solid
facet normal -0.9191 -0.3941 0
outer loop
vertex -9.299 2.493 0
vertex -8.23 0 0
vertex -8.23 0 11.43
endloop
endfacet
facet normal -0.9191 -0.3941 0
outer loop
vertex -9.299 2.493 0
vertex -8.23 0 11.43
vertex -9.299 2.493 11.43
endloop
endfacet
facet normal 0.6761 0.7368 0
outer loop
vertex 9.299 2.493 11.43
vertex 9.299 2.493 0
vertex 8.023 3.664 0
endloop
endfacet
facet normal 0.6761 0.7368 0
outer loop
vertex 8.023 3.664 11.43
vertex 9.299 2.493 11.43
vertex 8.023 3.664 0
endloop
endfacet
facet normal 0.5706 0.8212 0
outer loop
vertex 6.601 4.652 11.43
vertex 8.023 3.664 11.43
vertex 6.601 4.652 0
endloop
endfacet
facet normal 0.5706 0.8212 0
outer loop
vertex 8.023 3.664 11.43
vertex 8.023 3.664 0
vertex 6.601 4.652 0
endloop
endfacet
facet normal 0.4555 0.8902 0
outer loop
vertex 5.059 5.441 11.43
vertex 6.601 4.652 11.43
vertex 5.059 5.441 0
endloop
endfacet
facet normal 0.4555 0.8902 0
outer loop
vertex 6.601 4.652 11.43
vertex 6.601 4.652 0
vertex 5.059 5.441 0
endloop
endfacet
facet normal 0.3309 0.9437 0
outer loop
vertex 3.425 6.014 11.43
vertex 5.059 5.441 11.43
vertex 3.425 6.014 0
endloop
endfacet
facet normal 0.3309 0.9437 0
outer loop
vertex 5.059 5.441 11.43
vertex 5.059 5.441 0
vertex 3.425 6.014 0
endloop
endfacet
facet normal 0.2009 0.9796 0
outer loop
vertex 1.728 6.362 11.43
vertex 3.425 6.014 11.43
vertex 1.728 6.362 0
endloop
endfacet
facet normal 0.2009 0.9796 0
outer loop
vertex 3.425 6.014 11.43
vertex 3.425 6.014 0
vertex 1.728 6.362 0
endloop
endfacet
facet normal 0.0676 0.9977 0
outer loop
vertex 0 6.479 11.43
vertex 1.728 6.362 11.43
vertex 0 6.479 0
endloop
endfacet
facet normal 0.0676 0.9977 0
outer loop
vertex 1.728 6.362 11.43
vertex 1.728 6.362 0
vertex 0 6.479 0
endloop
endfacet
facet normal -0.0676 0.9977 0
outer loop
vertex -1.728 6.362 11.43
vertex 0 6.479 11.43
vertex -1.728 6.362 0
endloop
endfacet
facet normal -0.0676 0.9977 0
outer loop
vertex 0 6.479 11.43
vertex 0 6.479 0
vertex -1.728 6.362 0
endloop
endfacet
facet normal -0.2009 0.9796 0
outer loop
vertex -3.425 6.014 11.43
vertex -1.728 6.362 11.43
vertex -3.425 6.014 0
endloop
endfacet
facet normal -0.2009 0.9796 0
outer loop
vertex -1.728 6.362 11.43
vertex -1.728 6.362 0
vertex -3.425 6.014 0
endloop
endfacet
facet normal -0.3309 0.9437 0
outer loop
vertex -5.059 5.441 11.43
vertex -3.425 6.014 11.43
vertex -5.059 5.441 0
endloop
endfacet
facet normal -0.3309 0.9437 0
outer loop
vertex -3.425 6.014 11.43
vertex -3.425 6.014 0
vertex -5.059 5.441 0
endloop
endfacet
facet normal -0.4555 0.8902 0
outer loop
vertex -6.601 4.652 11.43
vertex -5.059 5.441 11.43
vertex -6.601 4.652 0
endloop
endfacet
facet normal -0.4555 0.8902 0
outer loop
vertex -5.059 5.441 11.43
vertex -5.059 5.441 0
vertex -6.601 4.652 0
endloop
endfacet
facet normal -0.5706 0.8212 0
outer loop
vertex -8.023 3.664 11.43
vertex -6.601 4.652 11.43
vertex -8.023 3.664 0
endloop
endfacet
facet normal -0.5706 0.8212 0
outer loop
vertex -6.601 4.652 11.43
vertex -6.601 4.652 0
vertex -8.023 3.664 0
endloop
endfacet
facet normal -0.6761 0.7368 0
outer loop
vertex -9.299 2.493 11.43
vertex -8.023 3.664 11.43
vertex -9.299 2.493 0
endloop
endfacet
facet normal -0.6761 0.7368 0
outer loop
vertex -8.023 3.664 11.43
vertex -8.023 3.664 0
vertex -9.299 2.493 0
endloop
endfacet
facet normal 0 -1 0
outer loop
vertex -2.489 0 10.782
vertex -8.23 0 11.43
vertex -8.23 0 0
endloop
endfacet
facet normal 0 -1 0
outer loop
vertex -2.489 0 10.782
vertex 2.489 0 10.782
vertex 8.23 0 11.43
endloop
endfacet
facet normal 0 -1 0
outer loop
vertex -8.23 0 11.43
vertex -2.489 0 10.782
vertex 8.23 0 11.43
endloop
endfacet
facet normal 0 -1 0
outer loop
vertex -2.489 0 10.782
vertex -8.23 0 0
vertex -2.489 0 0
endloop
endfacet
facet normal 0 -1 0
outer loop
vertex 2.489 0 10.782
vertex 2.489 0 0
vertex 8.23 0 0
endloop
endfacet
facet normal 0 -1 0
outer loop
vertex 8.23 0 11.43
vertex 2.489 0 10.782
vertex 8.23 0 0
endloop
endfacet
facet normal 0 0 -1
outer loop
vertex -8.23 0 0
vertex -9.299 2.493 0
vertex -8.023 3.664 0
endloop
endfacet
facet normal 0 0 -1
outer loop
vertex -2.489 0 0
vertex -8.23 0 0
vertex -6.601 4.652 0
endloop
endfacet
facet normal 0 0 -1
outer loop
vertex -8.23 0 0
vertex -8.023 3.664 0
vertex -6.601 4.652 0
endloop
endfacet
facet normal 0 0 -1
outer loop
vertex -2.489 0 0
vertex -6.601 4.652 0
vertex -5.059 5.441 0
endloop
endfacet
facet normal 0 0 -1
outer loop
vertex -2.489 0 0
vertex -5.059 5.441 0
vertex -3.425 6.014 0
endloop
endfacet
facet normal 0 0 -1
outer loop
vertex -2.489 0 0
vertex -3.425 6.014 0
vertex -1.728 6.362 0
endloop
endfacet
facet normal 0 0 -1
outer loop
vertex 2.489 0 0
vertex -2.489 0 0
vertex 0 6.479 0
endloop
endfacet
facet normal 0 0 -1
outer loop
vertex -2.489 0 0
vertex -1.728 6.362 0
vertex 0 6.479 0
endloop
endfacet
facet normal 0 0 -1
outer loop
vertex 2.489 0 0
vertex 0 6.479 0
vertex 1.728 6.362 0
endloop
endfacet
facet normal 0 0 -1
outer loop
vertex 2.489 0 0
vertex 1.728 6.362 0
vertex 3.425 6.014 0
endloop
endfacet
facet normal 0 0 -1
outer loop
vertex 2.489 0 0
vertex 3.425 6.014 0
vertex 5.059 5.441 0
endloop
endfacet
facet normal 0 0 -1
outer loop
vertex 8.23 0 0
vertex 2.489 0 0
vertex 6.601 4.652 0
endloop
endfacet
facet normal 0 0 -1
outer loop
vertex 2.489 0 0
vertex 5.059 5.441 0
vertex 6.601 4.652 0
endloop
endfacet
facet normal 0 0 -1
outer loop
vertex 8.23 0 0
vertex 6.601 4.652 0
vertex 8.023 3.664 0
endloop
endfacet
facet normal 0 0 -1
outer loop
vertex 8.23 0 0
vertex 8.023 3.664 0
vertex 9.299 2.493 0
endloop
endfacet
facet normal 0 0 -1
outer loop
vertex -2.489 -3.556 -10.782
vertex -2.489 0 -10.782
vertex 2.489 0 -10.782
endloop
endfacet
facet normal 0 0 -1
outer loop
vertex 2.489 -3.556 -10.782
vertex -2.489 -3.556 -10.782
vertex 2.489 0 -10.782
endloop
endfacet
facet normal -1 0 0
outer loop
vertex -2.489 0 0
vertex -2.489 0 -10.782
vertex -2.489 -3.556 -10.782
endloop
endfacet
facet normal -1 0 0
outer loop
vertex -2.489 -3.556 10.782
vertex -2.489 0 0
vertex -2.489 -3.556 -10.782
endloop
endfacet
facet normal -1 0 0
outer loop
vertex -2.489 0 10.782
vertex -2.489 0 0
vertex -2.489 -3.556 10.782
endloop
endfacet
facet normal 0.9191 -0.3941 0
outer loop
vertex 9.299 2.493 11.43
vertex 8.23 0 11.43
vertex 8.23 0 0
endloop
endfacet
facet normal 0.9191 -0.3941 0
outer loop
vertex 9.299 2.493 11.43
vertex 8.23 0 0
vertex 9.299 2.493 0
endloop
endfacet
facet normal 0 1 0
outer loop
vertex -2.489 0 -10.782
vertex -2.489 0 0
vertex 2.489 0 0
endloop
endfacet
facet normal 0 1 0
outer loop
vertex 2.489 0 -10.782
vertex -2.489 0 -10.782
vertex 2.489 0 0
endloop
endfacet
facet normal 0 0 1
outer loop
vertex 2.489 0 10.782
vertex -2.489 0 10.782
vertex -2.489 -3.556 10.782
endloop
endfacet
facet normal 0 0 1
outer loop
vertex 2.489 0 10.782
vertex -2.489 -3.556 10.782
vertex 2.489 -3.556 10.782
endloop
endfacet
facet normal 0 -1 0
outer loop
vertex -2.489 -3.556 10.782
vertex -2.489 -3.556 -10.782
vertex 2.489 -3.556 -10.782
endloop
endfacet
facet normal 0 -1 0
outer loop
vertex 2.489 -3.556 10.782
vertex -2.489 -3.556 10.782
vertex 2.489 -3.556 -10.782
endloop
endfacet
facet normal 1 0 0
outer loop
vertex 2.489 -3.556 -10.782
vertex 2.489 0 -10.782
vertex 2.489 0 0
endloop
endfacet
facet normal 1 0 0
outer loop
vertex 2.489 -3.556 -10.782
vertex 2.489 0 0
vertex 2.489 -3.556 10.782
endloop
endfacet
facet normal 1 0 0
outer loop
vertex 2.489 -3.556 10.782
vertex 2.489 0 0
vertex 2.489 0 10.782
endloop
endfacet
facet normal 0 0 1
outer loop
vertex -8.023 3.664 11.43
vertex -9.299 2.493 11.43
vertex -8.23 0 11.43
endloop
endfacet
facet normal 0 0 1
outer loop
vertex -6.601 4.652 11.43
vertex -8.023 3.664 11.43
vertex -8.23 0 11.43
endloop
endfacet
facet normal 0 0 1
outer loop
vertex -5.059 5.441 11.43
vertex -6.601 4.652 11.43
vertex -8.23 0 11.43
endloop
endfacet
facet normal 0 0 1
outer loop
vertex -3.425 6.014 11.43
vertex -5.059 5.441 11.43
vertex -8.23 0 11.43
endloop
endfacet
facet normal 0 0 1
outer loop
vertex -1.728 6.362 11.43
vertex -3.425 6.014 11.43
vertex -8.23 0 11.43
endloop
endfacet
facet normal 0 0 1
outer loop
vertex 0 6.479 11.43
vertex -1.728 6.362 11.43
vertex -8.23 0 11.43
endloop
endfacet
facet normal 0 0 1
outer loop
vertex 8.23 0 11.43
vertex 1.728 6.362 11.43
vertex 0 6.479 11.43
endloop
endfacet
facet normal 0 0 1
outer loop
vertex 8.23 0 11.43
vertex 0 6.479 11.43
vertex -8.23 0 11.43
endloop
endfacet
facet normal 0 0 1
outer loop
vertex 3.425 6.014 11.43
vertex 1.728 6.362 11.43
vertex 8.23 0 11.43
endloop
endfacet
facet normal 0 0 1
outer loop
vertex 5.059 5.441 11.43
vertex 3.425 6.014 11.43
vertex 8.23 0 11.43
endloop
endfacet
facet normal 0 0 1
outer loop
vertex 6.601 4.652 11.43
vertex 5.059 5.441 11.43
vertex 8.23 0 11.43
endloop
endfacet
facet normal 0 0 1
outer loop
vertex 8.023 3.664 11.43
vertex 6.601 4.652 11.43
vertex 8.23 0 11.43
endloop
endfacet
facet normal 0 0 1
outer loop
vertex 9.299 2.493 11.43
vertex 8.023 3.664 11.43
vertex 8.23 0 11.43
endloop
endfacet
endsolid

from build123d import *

# Parameters (mm, degrees)
F2_DEPTH    = 11.43
F0_W        = 4.9775806256
F0_H        = 21.5646
F3_DEPTH    = 3.556
F4_T1_DEPTH = 27.2262824301


# Not quite as in the source:
# - a fillet or chamfer that OpenCascade refuses, or shapes differently, is made with other operations: its cross-section is extruded or revolved along the edge and cut away or added


with BuildPart() as f2:
    # F1 (on Top) → F2 (new body)
    with BuildSketch(Plane.XY):
        with BuildLine():
            ThreePointArc((11.1534688622, 0), (0, 6.4792498177), (-11.1534688622, 0))
            Line((-11.1534688622, 0), (11.1534688622, 0))
        make_face()
    extrude(amount=F2_DEPTH)

    # F0 (on Front) → F3 (join)
    with BuildSketch(Plane.XZ):
        Rectangle(F0_W, F0_H)
    extrude(amount=F3_DEPTH)

    # F4: chamfer of 2.54 on 2 edges, made by hand

    # F4_s2 → F4_t1 (cut)
    with BuildSketch(Plane.XY.offset(-7.898141215)):
        with BuildLine():
            Line((-8.190415898, -0.0933816317), (-9.3391430842, 2.5863339915))
            Line((-9.3391430842, 2.5863339915), (-9.3759354233, 2.6213620343))
            ThreePointArc((-9.3759354233, 2.6213620343), (-10.327366328, 1.3537144774), (-11.1975980412, 0.0251645696))
            Line((-11.1975980412, 0.0251645696), (-11.1534688622, -0.0508))
            ThreePointArc((-11.1534688622, -0.0508), (-9.6719423801, -0.0508), (-8.190415898, -0.1441816317))
            Line((-8.190415898, -0.1441816317), (-8.190415898, -0.0933816317))
        make_face()
        with BuildLine():
            Line((8.190415898, -0.0933816317), (9.3391430842, 2.5863339915))
            Line((9.3391430842, 2.5863339915), (9.3759354233, 2.6213620343))
            ThreePointArc((9.3759354233, 2.6213620343), (10.327366328, 1.3537144774), (11.1975980412, 0.0251645696))
            Line((11.1975980412, 0.0251645696), (11.1534688622, -0.0508))
            ThreePointArc((11.1534688622, -0.0508), (9.6719423801, -0.0508), (8.190415898, -0.1441816317))
            Line((8.190415898, -0.1441816317), (8.190415898, -0.0933816317))
        make_face()
    extrude(amount=F4_T1_DEPTH, mode=Mode.SUBTRACT)


solid = f2.part
